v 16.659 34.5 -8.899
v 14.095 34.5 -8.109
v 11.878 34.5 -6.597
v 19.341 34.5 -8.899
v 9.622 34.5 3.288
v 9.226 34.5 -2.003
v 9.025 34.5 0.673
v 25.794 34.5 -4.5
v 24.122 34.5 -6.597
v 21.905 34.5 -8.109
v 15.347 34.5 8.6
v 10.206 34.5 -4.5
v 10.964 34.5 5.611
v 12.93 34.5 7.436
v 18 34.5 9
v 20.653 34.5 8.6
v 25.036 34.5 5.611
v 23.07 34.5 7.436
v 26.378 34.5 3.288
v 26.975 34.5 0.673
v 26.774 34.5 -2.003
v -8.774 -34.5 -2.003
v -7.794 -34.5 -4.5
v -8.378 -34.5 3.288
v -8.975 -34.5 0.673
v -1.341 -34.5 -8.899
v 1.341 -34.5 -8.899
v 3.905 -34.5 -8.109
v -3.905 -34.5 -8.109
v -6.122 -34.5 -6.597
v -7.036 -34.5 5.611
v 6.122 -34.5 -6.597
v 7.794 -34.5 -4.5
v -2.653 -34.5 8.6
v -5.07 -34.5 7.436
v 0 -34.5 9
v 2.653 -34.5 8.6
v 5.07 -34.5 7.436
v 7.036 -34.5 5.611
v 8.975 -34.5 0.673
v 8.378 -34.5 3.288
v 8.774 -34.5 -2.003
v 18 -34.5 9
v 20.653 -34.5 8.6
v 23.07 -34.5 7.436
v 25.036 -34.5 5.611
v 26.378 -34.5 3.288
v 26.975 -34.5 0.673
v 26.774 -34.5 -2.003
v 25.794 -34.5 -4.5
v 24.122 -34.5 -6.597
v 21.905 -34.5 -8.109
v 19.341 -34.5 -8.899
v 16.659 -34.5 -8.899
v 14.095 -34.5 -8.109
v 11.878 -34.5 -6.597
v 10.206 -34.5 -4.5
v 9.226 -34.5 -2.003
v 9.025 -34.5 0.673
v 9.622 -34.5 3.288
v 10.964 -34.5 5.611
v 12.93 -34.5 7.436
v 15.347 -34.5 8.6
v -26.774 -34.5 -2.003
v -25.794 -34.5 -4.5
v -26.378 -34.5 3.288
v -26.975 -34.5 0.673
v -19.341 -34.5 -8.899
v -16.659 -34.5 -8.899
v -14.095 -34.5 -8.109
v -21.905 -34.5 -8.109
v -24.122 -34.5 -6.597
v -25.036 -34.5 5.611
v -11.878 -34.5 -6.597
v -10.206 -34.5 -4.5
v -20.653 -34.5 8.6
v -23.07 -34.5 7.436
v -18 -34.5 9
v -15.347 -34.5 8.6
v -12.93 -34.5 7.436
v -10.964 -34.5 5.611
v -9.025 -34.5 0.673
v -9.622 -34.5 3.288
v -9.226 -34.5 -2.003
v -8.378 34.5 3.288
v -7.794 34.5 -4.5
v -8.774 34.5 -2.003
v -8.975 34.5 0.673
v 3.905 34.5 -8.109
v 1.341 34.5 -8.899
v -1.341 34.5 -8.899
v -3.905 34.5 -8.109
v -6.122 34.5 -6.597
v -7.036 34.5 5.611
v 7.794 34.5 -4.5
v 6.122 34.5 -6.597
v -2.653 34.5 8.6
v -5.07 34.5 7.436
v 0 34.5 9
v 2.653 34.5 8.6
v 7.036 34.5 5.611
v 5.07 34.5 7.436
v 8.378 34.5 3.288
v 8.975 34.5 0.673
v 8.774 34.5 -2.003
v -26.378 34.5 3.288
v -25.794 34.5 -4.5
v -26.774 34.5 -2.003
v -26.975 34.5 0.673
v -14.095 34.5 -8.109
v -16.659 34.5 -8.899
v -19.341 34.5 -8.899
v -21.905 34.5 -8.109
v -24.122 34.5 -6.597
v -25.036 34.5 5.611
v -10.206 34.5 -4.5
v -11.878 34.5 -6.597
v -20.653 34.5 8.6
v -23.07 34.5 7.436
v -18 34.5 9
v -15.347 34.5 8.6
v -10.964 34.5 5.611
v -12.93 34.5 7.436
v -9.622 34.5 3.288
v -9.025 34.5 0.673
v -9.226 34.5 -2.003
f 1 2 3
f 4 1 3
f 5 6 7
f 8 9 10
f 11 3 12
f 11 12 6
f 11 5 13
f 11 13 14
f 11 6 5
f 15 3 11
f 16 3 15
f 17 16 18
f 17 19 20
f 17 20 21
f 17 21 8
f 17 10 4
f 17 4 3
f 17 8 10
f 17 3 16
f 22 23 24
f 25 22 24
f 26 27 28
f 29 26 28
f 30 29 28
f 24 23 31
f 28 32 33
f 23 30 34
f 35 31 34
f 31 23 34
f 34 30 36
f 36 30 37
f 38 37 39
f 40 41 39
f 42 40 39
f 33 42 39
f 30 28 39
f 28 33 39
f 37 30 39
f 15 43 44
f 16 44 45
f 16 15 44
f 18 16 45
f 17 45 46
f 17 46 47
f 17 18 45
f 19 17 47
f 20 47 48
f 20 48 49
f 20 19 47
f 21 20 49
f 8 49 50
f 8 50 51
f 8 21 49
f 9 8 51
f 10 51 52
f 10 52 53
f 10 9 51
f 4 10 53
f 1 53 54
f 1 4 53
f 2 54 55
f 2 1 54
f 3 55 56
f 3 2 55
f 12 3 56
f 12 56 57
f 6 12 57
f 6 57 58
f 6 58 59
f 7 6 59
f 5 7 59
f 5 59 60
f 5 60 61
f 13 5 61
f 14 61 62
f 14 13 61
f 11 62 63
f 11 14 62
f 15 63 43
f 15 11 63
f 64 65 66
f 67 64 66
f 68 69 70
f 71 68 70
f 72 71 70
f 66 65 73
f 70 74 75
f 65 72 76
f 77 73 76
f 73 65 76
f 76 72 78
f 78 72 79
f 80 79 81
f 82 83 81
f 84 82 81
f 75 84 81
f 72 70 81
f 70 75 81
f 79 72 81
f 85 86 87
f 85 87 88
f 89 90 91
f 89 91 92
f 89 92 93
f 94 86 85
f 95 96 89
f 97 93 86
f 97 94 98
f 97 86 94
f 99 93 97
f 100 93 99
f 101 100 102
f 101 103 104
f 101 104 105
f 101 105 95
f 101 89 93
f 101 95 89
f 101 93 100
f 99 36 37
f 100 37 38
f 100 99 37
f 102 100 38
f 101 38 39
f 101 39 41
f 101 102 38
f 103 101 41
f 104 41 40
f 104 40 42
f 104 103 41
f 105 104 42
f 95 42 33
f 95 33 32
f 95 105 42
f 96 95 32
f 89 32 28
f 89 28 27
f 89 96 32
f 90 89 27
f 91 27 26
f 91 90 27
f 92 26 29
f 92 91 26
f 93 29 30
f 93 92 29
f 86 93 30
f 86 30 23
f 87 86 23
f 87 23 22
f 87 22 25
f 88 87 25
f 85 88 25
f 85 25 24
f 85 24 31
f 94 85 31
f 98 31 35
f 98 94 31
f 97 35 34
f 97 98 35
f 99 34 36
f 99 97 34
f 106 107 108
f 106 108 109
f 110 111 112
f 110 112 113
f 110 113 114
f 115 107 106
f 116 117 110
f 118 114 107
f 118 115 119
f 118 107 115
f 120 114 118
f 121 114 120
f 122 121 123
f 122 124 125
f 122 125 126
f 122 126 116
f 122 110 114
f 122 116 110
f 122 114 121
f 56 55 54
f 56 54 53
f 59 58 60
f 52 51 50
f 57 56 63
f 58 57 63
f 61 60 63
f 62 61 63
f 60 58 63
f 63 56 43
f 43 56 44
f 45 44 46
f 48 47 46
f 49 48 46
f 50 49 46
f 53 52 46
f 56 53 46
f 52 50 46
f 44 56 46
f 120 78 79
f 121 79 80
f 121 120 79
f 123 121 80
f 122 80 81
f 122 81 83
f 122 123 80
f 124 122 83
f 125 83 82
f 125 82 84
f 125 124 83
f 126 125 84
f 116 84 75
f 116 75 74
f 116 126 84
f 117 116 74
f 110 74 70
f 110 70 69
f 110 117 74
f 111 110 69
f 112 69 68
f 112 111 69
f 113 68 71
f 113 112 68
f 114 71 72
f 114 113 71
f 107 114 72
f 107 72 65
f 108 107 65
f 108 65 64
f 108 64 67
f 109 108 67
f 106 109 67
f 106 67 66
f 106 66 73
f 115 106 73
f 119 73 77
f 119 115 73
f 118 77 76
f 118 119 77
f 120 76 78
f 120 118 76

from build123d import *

# Parameters (mm, degrees)
SKETCH1_R             = 9
BOSS_EXTRUDE1_DEPTH   = 34.5
BOSS_EXTRUDE1_2_DEPTH = 34.5
BOSS_EXTRUDE1_3_DEPTH = 34.5


with BuildPart() as part:
    # Sketch1 → Boss-Extrude1 (new, symmetric)
    with BuildSketch(Plane(origin=(0, 0, 0), x_dir=(1, 0, 0), z_dir=(0, 1, 0))):
        with Locations(Location((-18, 0, 0), (0, 0, 270))):
            Circle(SKETCH1_R)
    extrude(amount=BOSS_EXTRUDE1_DEPTH, both=True)


with BuildPart() as body_2:
    # Sketch1 → Boss-Extrude1 2 (new, symmetric)
    with BuildSketch(Plane(origin=(0, 0, 0), x_dir=(1, 0, 0), z_dir=(0, 1, 0))):
        with Locations(Location((0, 0, 0), (0, 0, 270))):
            Circle(SKETCH1_R)
    extrude(amount=BOSS_EXTRUDE1_2_DEPTH, both=True)


with BuildPart() as body_3:
    # Sketch1 → Boss-Extrude1 3 (new, symmetric)
    with BuildSketch(Plane(origin=(0, 0, 0), x_dir=(1, 0, 0), z_dir=(0, 1, 0))):
        with Locations(Location((18, 0, 0), (0, 0, 270))):
            Circle(SKETCH1_R)
    extrude(amount=BOSS_EXTRUDE1_3_DEPTH, both=True)


solid = Compound([part.part, body_2.part, body_3.part])
